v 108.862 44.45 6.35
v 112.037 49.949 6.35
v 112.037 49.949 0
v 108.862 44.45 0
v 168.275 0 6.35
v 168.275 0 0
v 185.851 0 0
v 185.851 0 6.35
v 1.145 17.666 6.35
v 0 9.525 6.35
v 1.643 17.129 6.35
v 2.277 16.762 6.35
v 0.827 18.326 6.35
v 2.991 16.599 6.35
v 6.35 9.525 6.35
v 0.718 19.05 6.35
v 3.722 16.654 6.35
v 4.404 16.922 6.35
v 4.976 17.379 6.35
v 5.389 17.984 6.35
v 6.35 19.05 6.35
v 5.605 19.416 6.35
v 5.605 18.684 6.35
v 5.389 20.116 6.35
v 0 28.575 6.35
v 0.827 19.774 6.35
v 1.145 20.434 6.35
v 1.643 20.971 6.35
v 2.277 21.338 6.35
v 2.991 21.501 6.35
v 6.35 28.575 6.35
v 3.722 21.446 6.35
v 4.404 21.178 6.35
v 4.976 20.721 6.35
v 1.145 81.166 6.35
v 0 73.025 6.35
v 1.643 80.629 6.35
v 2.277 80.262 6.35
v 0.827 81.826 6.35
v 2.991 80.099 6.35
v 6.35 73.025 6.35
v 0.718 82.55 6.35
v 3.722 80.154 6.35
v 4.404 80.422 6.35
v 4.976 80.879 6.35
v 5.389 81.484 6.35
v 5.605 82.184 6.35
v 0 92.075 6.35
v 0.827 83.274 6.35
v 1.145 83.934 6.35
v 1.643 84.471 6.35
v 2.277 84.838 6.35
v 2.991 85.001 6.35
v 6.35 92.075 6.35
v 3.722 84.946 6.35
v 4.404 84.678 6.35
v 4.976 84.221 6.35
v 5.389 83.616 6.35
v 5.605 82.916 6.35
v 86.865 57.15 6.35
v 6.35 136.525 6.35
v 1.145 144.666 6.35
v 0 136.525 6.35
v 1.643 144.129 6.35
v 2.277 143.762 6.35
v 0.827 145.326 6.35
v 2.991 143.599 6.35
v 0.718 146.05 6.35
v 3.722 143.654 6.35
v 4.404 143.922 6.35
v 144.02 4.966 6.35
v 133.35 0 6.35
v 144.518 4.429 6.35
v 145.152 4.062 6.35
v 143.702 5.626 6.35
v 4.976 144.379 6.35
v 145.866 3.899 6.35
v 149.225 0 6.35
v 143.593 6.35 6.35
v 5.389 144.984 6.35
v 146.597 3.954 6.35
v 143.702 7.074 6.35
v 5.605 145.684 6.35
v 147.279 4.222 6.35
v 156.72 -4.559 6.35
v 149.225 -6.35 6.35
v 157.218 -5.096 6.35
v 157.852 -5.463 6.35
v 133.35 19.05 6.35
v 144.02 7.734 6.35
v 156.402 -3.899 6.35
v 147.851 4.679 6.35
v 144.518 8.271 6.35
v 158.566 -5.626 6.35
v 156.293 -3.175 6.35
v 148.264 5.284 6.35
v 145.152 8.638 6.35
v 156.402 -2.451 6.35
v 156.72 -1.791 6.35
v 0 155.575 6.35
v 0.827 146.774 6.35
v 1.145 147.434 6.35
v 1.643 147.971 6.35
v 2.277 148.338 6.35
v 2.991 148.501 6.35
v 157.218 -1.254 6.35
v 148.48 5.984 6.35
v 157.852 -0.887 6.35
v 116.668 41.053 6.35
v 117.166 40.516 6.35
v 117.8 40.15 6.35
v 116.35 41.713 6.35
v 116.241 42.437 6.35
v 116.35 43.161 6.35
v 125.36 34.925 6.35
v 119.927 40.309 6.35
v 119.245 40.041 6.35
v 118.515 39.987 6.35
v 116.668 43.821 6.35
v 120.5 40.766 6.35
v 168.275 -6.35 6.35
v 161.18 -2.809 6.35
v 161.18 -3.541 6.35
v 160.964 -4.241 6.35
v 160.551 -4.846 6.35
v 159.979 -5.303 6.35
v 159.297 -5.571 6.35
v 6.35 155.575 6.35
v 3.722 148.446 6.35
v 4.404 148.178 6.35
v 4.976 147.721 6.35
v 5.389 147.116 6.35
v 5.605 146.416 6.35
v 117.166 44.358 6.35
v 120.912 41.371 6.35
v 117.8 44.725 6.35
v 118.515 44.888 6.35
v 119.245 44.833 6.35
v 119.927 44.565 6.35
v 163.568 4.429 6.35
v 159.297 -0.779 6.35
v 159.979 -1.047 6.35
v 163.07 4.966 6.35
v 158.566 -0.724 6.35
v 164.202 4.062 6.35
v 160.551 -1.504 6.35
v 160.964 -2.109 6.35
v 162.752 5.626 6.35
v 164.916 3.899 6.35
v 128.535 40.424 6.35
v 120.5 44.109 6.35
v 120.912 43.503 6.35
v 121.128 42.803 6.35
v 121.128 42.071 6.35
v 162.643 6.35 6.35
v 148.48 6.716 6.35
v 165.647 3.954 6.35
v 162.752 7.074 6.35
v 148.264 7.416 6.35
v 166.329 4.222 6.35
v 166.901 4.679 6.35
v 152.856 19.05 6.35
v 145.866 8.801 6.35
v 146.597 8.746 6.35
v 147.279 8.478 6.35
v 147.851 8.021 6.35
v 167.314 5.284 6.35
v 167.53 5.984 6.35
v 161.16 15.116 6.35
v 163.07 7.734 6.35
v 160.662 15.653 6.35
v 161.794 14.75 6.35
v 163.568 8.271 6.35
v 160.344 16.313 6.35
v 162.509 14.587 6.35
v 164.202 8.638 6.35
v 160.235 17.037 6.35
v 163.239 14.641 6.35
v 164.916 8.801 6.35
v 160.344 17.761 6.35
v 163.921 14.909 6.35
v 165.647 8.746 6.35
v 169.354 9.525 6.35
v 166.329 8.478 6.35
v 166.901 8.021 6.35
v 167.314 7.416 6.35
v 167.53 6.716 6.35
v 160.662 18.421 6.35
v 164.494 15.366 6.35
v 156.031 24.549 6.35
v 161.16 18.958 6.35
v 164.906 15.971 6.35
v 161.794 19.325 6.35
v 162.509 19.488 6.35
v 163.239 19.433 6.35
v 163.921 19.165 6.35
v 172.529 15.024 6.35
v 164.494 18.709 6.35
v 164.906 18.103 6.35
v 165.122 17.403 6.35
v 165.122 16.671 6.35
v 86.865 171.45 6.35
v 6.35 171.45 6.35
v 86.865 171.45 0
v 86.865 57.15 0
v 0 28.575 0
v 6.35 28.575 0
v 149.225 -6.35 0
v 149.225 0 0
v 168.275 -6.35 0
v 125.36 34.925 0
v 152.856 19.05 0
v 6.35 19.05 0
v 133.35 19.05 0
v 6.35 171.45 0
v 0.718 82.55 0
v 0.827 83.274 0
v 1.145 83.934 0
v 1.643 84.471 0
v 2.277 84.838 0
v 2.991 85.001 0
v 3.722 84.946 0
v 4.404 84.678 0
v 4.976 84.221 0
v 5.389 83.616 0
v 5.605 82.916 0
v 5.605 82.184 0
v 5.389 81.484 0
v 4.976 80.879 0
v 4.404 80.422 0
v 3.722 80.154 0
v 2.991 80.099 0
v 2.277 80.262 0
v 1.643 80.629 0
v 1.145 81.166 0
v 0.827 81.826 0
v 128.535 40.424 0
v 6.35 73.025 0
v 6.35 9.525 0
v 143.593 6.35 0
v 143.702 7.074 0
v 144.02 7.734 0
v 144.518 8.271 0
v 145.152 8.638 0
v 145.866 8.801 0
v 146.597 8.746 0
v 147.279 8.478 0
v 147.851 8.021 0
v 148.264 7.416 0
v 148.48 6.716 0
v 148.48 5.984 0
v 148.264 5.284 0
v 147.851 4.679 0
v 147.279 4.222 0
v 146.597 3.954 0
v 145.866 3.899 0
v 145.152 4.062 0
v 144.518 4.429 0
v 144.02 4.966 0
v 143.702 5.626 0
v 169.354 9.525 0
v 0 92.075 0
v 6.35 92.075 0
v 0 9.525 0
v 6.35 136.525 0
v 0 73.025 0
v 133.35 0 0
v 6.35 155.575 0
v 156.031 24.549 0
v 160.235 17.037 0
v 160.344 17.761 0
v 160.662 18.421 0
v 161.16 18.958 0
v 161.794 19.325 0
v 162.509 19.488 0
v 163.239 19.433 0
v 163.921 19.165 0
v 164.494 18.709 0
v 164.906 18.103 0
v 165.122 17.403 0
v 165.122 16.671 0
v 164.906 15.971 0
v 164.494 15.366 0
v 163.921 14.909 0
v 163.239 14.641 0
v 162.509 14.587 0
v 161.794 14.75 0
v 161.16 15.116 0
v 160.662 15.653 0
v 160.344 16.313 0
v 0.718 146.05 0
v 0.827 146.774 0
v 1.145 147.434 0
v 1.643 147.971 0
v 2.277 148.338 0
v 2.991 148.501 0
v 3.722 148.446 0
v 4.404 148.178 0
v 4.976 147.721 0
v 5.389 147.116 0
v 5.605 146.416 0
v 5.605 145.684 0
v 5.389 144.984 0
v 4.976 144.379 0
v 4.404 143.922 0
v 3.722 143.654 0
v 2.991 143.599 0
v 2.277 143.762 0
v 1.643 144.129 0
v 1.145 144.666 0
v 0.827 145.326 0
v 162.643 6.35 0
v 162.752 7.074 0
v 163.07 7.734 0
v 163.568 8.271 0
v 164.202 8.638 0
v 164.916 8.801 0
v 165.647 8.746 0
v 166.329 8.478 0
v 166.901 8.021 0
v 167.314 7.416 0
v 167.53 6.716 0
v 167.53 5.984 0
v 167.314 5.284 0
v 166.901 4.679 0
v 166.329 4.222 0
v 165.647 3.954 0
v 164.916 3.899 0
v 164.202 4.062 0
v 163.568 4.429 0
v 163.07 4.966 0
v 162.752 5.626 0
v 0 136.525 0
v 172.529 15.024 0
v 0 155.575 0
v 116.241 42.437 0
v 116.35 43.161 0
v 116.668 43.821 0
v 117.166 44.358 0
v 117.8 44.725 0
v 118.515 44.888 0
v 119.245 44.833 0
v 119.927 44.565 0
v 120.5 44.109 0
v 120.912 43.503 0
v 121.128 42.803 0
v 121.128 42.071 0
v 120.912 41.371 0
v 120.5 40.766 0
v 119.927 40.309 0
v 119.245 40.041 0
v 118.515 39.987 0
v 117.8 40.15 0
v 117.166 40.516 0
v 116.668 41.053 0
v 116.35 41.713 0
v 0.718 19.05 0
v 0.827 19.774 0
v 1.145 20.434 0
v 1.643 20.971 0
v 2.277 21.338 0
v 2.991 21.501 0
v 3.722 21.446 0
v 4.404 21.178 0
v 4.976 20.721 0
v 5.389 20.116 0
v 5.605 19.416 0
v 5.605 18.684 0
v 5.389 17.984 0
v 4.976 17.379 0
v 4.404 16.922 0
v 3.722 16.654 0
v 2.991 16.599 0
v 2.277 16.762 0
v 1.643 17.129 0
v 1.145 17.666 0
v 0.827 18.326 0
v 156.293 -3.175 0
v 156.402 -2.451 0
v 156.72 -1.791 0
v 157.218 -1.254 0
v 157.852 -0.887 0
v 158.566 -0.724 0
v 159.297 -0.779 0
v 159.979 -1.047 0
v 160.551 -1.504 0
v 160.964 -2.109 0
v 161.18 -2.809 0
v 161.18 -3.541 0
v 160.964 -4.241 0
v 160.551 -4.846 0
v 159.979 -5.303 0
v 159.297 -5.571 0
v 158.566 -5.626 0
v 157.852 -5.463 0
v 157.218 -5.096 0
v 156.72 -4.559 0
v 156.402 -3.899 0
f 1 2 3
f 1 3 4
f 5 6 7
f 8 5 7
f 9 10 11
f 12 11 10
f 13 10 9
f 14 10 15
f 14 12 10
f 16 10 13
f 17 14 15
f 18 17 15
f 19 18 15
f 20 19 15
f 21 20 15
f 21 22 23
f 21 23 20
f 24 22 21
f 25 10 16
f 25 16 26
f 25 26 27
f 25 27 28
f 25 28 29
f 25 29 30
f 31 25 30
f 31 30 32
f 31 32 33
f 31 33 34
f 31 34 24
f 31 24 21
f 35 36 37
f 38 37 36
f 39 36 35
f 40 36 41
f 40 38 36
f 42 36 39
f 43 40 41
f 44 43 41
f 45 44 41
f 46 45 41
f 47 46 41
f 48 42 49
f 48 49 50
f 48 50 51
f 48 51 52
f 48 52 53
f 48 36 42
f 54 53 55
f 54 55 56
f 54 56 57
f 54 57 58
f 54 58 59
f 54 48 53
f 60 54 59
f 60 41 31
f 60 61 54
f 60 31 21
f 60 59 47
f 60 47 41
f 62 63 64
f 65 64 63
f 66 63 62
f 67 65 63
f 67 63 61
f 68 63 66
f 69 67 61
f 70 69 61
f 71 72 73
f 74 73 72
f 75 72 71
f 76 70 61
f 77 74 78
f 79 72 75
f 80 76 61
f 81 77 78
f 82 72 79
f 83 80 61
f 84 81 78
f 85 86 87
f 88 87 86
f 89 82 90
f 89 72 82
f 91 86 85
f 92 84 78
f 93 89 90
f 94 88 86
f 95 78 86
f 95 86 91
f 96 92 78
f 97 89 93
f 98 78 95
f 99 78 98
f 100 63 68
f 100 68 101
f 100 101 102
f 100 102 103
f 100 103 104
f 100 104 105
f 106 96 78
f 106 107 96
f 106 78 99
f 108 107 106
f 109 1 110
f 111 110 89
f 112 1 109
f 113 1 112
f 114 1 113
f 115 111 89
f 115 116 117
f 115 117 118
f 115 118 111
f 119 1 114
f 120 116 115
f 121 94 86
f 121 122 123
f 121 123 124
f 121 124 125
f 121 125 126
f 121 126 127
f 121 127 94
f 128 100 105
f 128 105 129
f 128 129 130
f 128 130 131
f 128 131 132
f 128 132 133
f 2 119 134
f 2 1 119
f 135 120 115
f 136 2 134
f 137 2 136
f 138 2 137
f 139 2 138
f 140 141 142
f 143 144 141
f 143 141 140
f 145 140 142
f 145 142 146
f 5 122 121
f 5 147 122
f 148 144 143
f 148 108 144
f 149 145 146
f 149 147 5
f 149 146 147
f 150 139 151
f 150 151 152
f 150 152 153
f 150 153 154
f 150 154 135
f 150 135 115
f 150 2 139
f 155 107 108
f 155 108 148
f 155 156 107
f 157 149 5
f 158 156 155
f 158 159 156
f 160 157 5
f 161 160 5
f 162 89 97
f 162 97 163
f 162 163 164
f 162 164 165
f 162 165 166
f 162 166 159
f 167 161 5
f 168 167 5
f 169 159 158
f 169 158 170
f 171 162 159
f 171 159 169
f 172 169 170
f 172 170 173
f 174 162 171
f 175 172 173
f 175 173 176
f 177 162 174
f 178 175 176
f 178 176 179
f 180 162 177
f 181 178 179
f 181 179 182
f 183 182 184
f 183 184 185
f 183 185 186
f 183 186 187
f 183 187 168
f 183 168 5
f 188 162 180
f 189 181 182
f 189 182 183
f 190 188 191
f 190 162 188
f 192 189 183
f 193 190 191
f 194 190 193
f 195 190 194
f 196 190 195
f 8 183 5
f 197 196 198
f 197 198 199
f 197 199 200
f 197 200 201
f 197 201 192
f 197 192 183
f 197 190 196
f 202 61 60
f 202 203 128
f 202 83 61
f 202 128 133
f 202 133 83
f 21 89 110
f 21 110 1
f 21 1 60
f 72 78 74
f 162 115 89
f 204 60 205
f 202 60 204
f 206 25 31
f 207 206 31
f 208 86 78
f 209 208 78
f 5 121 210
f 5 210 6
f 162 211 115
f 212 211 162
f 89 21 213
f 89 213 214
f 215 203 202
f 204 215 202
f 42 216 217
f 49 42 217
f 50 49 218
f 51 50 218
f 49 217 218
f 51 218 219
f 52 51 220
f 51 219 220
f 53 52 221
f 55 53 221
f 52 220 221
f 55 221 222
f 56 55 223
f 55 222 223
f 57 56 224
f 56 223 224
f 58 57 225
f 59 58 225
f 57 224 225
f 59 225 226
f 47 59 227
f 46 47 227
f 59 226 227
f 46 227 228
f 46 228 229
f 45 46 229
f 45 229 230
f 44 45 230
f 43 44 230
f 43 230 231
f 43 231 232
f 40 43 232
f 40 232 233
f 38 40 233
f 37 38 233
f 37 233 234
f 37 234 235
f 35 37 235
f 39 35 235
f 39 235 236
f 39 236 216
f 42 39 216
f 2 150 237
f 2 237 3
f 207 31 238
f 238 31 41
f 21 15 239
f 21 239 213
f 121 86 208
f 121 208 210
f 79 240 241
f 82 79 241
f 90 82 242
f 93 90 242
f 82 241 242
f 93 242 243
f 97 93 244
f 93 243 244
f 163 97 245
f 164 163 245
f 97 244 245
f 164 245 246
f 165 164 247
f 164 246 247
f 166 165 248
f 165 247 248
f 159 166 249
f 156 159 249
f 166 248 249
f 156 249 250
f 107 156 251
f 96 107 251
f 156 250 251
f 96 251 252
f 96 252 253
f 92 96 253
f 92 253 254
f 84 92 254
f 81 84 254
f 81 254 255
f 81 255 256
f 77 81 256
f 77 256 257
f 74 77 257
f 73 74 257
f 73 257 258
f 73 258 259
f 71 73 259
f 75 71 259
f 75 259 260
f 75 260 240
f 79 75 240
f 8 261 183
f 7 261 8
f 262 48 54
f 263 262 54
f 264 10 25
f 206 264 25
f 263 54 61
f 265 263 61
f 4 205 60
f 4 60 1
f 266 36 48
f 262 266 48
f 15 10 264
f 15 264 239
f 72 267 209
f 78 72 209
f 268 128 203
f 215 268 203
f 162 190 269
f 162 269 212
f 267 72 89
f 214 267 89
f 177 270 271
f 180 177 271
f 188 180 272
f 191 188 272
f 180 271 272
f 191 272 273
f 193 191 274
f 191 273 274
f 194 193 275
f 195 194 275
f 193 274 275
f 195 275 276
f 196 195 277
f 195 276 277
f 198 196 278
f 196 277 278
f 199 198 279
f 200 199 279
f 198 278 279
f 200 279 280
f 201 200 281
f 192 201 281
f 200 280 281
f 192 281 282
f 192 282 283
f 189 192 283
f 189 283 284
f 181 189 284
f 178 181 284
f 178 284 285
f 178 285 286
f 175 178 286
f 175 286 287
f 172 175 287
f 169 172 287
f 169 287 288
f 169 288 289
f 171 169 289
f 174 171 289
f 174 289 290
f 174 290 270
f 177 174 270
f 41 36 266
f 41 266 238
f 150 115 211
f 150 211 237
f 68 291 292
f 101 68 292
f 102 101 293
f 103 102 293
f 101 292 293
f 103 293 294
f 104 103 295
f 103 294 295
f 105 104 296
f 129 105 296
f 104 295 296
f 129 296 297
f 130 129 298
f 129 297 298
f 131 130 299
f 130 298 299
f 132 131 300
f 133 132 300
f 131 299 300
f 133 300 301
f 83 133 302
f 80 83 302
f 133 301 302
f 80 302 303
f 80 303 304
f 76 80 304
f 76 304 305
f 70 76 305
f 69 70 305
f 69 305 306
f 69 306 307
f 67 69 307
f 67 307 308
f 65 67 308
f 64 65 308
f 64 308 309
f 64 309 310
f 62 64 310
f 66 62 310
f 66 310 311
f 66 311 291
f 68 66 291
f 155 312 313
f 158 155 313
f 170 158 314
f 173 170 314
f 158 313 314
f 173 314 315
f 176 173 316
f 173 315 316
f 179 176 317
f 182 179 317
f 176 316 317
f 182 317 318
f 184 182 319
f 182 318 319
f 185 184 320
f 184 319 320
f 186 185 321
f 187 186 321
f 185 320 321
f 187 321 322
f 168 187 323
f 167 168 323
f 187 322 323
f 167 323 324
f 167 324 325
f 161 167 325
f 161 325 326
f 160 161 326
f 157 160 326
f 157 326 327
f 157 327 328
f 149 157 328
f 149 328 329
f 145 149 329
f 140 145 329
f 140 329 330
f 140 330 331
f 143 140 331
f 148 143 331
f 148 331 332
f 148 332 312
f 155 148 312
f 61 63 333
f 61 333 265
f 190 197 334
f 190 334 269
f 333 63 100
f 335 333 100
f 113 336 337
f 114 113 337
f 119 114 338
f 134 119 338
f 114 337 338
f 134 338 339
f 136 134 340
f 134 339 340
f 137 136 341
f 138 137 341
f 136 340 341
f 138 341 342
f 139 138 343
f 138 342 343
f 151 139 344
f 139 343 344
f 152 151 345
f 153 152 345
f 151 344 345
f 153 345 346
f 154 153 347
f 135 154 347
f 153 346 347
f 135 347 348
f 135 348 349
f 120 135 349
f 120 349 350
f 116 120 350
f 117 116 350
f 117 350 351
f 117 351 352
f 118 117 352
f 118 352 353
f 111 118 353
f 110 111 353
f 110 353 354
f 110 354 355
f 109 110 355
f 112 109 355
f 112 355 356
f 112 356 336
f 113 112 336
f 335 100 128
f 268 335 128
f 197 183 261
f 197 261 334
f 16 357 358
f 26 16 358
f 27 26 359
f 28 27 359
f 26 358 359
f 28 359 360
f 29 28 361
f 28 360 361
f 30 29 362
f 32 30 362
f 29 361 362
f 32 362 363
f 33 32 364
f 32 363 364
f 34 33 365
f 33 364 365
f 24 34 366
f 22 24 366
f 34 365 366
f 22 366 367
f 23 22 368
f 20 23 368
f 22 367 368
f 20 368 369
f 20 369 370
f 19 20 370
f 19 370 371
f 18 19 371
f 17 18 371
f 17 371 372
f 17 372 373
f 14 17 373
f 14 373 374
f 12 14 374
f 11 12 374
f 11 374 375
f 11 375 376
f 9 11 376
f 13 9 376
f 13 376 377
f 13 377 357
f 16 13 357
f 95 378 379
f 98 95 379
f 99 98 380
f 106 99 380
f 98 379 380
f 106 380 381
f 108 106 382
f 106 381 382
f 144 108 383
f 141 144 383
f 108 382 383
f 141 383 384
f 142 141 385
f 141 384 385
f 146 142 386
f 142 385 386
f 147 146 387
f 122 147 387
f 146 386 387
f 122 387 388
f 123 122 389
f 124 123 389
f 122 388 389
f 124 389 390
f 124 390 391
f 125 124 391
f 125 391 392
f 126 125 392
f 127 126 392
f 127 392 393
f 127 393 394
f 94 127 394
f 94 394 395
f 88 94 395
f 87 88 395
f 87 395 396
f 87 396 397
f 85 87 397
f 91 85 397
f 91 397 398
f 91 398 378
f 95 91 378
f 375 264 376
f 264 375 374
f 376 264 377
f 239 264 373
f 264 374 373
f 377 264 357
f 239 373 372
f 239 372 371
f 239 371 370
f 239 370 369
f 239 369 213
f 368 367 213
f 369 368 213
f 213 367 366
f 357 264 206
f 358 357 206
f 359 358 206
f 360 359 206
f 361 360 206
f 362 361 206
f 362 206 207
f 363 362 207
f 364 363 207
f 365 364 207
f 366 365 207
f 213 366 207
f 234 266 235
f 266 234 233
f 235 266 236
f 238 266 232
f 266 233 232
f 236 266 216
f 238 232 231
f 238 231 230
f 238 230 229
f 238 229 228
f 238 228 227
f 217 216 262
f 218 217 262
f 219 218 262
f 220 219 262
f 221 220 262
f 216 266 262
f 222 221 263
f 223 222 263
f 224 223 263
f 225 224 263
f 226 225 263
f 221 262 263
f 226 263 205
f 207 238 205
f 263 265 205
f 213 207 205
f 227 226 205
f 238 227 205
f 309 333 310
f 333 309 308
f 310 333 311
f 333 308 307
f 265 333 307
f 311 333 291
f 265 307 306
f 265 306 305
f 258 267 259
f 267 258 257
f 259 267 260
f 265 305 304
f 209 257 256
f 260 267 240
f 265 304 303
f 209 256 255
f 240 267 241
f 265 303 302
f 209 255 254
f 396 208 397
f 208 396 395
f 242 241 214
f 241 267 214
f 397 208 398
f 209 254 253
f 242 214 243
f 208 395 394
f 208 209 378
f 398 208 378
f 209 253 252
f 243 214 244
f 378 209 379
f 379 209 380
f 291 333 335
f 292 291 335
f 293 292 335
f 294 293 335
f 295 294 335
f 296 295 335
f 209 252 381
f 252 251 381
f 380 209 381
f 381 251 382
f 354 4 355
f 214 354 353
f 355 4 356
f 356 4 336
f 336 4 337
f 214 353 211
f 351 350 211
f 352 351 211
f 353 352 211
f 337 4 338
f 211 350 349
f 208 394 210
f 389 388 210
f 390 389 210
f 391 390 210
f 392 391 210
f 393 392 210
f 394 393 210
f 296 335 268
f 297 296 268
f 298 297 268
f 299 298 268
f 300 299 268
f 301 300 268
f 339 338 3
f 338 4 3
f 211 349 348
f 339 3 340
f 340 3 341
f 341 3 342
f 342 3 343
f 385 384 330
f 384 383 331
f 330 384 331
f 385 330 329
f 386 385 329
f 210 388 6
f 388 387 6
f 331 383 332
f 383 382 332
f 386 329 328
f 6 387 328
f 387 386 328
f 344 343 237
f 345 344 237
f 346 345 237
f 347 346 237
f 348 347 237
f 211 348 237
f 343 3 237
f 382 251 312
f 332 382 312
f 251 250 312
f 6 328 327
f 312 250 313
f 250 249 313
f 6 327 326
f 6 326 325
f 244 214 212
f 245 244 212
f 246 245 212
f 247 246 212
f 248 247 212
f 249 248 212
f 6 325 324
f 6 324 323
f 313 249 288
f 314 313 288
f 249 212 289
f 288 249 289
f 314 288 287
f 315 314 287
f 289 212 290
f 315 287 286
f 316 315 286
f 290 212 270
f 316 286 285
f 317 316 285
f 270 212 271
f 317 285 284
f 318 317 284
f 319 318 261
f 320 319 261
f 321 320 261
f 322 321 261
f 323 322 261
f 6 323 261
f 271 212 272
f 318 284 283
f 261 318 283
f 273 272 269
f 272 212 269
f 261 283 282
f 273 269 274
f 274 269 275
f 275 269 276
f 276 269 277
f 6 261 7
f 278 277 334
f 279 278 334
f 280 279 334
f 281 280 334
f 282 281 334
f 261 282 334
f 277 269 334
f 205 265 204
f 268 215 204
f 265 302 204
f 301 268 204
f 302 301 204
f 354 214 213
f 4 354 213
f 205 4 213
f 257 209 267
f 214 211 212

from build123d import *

# Parameters (mm, degrees)
BOSS_EXTRUDE1_DEPTH          = 6.35
SKETCH2_W                    = 127
SKETCH2_H                    = 19.05
CUT_EXTRUDE1_DEPTH           = 195.543611155
SKETCH3_W                    = 86.864773719
SKETCH3_H                    = 114.3
BOSS_EXTRUDE2_DEPTH          = 6.35
SKETCH4_W                    = 6.35
SKETCH4_H                    = 9.525
SKETCH4_H_2                  = 44.45
SKETCH4_H_3                  = 15.875
CUT_EXTRUDE2_DEPTH           = 253.93516292
SKETCH5_W                    = 19.05
SKETCH5_H                    = 6.35
BOSS_EXTRUDE3_DEPTH          = 6.35
BOSS_EXTRUDE4_DEPTH          = 6.35
LPATTERN1_COUNT              = 2
LPATTERN1_PITCH              = 50.8
F_10_0_1935_DIAMETER_HOLE1_D = 4.9149
F_10_0_1935_DIAMETER_HOLE2_D = 4.9149
F_10_0_1935_DIAMETER_HOLE3_D = 4.9149


with BuildPart() as part:
    # Sketch1 → Boss-Extrude1 (new body)
    with BuildSketch(Plane.XY):
        Polygon((86.864773719, 57.15), (185.851477372, 0), (86.864773719, 0), (0, 0), (0, 57.15), align=None)
    extrude(amount=BOSS_EXTRUDE1_DEPTH)

    # Sketch2 → Cut-Extrude1 (cut, through all)
    with BuildSketch(Plane.XY.offset(6.35)):
        with Locations((69.85, 9.525)):
            Rectangle(SKETCH2_W, SKETCH2_H)
    extrude(amount=-CUT_EXTRUDE1_DEPTH, mode=Mode.SUBTRACT)

    # Sketch3 → Boss-Extrude2 (add)
    with BuildSketch(Plane.XY.offset(6.35)):
        with Locations((43.432386859, 114.3)):
            Rectangle(SKETCH3_W, SKETCH3_H)
    extrude(amount=-BOSS_EXTRUDE2_DEPTH)

    # Sketch4 → Cut-Extrude2 (cut, through all)
    with BuildSketch(Plane.XY.offset(6.35)):
        with Locations((3.175, 4.7625)):
            Rectangle(SKETCH4_W, SKETCH4_H)
        with Locations((3.175, 50.8)):
            Rectangle(SKETCH4_W, SKETCH4_H_2)
        with Locations((3.175, 114.3)):
            Rectangle(SKETCH4_W, SKETCH4_H_2)
        with Locations((3.175, 163.5125)):
            Rectangle(SKETCH4_W, SKETCH4_H_3)
    extrude(amount=-CUT_EXTRUDE2_DEPTH, mode=Mode.SUBTRACT)

    # Sketch5 → Boss-Extrude3 (add)
    with BuildSketch(Plane.XY.offset(6.35)):
        with Locations((158.75, -3.175)):
            Rectangle(SKETCH5_W, SKETCH5_H)
    extrude(amount=-BOSS_EXTRUDE3_DEPTH)

    # Sketch6 → Boss-Extrude4 (add)
    with BuildSketch(Plane.XY.offset(6.35)):
        Polygon((108.861818976, 44.45), (125.359602918, 34.925), (128.534602918, 40.424261314), (112.036818976, 49.949261314), align=None)
    boss_extrude4 = extrude(amount=-BOSS_EXTRUDE4_DEPTH)

    # LPattern1: Boss-Extrude4 ×2
    with Locations(*[Vector(0.8660254037844415, -0.49999999999999517, 0) * (i * LPATTERN1_PITCH) for i in range(1, LPATTERN1_COUNT)]):
        add(boss_extrude4)

    # #10 (0.1935) Diameter Hole1 (through all)
    with Locations(Plane.XY.offset(6.35)):
        with Locations((3.175, 146.05), (3.175, 82.55), (3.175, 19.05)):
            Hole(F_10_0_1935_DIAMETER_HOLE1_D / 2)

    # #10 (0.1935) Diameter Hole2 (through all)
    with Locations(Plane.XY.offset(6.35)):
        with Locations((118.698210947, 42.437130657), (162.692301459, 17.037130657), (158.75, -3.175)):
            Hole(F_10_0_1935_DIAMETER_HOLE2_D / 2)

    # #10 (0.1935) Diameter Hole3 (through all)
    with Locations(Plane.XY.offset(6.35)):
        with Locations((146.05, 6.35), (165.1, 6.35)):
            Hole(F_10_0_1935_DIAMETER_HOLE3_D / 2)


solid = part.part
